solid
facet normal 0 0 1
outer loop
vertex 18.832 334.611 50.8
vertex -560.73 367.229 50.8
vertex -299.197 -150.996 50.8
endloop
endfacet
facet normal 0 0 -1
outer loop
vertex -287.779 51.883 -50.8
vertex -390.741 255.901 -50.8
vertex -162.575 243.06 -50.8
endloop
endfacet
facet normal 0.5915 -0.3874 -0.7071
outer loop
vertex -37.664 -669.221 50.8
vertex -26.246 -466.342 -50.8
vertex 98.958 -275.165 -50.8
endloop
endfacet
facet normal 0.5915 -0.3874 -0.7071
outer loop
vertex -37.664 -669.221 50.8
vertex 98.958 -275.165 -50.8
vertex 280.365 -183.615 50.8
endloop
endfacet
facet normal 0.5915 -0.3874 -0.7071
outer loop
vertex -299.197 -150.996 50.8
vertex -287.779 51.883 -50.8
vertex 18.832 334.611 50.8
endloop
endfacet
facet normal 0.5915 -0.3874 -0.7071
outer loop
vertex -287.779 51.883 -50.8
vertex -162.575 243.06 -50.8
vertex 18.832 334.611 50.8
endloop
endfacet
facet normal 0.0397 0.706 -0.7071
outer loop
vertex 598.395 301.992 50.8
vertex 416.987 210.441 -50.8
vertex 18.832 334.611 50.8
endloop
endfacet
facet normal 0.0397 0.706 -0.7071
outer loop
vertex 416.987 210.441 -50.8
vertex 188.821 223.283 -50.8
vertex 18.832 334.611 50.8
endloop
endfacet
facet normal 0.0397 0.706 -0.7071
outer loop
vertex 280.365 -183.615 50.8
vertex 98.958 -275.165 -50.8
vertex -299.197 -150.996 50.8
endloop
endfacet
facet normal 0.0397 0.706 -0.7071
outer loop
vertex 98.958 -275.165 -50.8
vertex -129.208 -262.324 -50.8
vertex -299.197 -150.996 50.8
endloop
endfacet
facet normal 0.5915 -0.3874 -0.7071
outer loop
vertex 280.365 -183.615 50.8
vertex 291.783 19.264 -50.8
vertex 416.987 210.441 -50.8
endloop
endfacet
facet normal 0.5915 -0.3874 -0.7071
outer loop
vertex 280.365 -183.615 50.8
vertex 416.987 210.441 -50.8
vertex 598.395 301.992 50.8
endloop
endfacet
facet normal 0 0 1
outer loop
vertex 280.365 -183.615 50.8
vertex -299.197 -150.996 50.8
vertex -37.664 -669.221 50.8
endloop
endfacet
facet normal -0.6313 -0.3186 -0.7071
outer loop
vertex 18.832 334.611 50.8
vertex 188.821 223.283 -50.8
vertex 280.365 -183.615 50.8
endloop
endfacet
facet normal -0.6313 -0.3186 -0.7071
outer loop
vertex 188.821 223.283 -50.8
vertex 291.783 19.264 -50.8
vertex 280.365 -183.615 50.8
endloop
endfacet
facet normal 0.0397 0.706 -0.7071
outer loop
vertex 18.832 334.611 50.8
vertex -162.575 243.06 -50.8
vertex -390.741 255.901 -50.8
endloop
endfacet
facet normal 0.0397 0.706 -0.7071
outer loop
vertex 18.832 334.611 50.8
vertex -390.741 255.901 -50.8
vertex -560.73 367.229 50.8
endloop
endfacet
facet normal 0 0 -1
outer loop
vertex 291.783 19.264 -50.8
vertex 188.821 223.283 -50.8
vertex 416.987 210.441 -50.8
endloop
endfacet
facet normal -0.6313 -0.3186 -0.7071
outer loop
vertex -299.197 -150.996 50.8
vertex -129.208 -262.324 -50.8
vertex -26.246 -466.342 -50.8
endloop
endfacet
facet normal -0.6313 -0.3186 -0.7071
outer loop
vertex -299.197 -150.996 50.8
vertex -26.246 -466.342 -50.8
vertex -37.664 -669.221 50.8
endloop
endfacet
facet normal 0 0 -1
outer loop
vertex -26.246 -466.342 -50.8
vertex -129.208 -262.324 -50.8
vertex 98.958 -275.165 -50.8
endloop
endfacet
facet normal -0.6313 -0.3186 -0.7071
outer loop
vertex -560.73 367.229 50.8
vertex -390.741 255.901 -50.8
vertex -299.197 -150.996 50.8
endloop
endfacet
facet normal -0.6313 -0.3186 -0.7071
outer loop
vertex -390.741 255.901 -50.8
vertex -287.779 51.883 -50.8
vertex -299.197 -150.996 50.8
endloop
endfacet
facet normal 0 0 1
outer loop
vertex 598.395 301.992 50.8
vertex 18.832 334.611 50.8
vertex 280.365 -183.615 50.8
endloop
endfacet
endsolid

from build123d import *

# Parameters (mm, degrees)
F1_DEPTH  = 50.8
F2_SIZE   = 101.59999
F2_2_SIZE = 101.59999
F2_3_SIZE = 101.59999


# Not quite as in the source:
# - a fillet or chamfer is up to 0.001 mm smaller than in the source, because OpenCascade refuses the exact size


with BuildPart() as f1:
    # F0 (on Top) → F1 (new body, symmetric)
    with BuildSketch(Plane.XY):
        Polygon((280.3652053341, -183.6145129428), (598.3948707581, 301.9922673702), (18.832230045, 334.6106466279), align=None)
    extrude(amount=F1_DEPTH, both=True)

    # F2 (size 101.6 in the source; OpenCascade refuses exactly that, so slightly less here)
    f2_edges = [f1.edges().sort_by_distance(p)[0] for p in [
        (308.61355, 318.301457, -50.8),
        (439.380038, 59.188877, -50.8),
        (149.598718, 75.498067, -50.8),
    ]]
    chamfer(f2_edges, length=F2_SIZE)


with BuildPart() as f1b:
    # F0 (on Top) → F1, piece 2 (new body, symmetric)
    with BuildSketch(Plane.XY):
        Polygon((-37.66446009, -669.2212932559), (280.3652053341, -183.6145129428), (-299.197435379, -150.9961336851), align=None)
    extrude(amount=F1_DEPTH, both=True)

    # F2#2 (size 101.6 in the source; OpenCascade refuses exactly that, so slightly less here)
    f2_2_edges = [f1b.edges().sort_by_distance(p)[0] for p in [
        (-9.416115, -167.305323, -50.8),
        (121.350373, -426.417903, -50.8),
        (-168.430948, -410.108713, -50.8),
    ]]
    chamfer(f2_2_edges, length=F2_2_SIZE)


with BuildPart() as f1c:
    # F0 (on Top) → F1, piece 3 (new body, symmetric)
    with BuildSketch(Plane.XY):
        Polygon((-299.197435379, -150.9961336851), (18.832230045, 334.6106466279), (-560.7304106681, 367.2290258857), align=None)
    extrude(amount=F1_DEPTH, both=True)

    # F2#3 (size 101.6 in the source; OpenCascade refuses exactly that, so slightly less here)
    f2_3_edges = [f1c.edges().sort_by_distance(p)[0] for p in [
        (-429.963923, 108.116446, -50.8),
        (-270.94909, 350.919836, -50.8),
        (-140.182603, 91.807256, -50.8),
    ]]
    chamfer(f2_3_edges, length=F2_3_SIZE)


solid = Compound([f1.part, f1b.part, f1c.part])
